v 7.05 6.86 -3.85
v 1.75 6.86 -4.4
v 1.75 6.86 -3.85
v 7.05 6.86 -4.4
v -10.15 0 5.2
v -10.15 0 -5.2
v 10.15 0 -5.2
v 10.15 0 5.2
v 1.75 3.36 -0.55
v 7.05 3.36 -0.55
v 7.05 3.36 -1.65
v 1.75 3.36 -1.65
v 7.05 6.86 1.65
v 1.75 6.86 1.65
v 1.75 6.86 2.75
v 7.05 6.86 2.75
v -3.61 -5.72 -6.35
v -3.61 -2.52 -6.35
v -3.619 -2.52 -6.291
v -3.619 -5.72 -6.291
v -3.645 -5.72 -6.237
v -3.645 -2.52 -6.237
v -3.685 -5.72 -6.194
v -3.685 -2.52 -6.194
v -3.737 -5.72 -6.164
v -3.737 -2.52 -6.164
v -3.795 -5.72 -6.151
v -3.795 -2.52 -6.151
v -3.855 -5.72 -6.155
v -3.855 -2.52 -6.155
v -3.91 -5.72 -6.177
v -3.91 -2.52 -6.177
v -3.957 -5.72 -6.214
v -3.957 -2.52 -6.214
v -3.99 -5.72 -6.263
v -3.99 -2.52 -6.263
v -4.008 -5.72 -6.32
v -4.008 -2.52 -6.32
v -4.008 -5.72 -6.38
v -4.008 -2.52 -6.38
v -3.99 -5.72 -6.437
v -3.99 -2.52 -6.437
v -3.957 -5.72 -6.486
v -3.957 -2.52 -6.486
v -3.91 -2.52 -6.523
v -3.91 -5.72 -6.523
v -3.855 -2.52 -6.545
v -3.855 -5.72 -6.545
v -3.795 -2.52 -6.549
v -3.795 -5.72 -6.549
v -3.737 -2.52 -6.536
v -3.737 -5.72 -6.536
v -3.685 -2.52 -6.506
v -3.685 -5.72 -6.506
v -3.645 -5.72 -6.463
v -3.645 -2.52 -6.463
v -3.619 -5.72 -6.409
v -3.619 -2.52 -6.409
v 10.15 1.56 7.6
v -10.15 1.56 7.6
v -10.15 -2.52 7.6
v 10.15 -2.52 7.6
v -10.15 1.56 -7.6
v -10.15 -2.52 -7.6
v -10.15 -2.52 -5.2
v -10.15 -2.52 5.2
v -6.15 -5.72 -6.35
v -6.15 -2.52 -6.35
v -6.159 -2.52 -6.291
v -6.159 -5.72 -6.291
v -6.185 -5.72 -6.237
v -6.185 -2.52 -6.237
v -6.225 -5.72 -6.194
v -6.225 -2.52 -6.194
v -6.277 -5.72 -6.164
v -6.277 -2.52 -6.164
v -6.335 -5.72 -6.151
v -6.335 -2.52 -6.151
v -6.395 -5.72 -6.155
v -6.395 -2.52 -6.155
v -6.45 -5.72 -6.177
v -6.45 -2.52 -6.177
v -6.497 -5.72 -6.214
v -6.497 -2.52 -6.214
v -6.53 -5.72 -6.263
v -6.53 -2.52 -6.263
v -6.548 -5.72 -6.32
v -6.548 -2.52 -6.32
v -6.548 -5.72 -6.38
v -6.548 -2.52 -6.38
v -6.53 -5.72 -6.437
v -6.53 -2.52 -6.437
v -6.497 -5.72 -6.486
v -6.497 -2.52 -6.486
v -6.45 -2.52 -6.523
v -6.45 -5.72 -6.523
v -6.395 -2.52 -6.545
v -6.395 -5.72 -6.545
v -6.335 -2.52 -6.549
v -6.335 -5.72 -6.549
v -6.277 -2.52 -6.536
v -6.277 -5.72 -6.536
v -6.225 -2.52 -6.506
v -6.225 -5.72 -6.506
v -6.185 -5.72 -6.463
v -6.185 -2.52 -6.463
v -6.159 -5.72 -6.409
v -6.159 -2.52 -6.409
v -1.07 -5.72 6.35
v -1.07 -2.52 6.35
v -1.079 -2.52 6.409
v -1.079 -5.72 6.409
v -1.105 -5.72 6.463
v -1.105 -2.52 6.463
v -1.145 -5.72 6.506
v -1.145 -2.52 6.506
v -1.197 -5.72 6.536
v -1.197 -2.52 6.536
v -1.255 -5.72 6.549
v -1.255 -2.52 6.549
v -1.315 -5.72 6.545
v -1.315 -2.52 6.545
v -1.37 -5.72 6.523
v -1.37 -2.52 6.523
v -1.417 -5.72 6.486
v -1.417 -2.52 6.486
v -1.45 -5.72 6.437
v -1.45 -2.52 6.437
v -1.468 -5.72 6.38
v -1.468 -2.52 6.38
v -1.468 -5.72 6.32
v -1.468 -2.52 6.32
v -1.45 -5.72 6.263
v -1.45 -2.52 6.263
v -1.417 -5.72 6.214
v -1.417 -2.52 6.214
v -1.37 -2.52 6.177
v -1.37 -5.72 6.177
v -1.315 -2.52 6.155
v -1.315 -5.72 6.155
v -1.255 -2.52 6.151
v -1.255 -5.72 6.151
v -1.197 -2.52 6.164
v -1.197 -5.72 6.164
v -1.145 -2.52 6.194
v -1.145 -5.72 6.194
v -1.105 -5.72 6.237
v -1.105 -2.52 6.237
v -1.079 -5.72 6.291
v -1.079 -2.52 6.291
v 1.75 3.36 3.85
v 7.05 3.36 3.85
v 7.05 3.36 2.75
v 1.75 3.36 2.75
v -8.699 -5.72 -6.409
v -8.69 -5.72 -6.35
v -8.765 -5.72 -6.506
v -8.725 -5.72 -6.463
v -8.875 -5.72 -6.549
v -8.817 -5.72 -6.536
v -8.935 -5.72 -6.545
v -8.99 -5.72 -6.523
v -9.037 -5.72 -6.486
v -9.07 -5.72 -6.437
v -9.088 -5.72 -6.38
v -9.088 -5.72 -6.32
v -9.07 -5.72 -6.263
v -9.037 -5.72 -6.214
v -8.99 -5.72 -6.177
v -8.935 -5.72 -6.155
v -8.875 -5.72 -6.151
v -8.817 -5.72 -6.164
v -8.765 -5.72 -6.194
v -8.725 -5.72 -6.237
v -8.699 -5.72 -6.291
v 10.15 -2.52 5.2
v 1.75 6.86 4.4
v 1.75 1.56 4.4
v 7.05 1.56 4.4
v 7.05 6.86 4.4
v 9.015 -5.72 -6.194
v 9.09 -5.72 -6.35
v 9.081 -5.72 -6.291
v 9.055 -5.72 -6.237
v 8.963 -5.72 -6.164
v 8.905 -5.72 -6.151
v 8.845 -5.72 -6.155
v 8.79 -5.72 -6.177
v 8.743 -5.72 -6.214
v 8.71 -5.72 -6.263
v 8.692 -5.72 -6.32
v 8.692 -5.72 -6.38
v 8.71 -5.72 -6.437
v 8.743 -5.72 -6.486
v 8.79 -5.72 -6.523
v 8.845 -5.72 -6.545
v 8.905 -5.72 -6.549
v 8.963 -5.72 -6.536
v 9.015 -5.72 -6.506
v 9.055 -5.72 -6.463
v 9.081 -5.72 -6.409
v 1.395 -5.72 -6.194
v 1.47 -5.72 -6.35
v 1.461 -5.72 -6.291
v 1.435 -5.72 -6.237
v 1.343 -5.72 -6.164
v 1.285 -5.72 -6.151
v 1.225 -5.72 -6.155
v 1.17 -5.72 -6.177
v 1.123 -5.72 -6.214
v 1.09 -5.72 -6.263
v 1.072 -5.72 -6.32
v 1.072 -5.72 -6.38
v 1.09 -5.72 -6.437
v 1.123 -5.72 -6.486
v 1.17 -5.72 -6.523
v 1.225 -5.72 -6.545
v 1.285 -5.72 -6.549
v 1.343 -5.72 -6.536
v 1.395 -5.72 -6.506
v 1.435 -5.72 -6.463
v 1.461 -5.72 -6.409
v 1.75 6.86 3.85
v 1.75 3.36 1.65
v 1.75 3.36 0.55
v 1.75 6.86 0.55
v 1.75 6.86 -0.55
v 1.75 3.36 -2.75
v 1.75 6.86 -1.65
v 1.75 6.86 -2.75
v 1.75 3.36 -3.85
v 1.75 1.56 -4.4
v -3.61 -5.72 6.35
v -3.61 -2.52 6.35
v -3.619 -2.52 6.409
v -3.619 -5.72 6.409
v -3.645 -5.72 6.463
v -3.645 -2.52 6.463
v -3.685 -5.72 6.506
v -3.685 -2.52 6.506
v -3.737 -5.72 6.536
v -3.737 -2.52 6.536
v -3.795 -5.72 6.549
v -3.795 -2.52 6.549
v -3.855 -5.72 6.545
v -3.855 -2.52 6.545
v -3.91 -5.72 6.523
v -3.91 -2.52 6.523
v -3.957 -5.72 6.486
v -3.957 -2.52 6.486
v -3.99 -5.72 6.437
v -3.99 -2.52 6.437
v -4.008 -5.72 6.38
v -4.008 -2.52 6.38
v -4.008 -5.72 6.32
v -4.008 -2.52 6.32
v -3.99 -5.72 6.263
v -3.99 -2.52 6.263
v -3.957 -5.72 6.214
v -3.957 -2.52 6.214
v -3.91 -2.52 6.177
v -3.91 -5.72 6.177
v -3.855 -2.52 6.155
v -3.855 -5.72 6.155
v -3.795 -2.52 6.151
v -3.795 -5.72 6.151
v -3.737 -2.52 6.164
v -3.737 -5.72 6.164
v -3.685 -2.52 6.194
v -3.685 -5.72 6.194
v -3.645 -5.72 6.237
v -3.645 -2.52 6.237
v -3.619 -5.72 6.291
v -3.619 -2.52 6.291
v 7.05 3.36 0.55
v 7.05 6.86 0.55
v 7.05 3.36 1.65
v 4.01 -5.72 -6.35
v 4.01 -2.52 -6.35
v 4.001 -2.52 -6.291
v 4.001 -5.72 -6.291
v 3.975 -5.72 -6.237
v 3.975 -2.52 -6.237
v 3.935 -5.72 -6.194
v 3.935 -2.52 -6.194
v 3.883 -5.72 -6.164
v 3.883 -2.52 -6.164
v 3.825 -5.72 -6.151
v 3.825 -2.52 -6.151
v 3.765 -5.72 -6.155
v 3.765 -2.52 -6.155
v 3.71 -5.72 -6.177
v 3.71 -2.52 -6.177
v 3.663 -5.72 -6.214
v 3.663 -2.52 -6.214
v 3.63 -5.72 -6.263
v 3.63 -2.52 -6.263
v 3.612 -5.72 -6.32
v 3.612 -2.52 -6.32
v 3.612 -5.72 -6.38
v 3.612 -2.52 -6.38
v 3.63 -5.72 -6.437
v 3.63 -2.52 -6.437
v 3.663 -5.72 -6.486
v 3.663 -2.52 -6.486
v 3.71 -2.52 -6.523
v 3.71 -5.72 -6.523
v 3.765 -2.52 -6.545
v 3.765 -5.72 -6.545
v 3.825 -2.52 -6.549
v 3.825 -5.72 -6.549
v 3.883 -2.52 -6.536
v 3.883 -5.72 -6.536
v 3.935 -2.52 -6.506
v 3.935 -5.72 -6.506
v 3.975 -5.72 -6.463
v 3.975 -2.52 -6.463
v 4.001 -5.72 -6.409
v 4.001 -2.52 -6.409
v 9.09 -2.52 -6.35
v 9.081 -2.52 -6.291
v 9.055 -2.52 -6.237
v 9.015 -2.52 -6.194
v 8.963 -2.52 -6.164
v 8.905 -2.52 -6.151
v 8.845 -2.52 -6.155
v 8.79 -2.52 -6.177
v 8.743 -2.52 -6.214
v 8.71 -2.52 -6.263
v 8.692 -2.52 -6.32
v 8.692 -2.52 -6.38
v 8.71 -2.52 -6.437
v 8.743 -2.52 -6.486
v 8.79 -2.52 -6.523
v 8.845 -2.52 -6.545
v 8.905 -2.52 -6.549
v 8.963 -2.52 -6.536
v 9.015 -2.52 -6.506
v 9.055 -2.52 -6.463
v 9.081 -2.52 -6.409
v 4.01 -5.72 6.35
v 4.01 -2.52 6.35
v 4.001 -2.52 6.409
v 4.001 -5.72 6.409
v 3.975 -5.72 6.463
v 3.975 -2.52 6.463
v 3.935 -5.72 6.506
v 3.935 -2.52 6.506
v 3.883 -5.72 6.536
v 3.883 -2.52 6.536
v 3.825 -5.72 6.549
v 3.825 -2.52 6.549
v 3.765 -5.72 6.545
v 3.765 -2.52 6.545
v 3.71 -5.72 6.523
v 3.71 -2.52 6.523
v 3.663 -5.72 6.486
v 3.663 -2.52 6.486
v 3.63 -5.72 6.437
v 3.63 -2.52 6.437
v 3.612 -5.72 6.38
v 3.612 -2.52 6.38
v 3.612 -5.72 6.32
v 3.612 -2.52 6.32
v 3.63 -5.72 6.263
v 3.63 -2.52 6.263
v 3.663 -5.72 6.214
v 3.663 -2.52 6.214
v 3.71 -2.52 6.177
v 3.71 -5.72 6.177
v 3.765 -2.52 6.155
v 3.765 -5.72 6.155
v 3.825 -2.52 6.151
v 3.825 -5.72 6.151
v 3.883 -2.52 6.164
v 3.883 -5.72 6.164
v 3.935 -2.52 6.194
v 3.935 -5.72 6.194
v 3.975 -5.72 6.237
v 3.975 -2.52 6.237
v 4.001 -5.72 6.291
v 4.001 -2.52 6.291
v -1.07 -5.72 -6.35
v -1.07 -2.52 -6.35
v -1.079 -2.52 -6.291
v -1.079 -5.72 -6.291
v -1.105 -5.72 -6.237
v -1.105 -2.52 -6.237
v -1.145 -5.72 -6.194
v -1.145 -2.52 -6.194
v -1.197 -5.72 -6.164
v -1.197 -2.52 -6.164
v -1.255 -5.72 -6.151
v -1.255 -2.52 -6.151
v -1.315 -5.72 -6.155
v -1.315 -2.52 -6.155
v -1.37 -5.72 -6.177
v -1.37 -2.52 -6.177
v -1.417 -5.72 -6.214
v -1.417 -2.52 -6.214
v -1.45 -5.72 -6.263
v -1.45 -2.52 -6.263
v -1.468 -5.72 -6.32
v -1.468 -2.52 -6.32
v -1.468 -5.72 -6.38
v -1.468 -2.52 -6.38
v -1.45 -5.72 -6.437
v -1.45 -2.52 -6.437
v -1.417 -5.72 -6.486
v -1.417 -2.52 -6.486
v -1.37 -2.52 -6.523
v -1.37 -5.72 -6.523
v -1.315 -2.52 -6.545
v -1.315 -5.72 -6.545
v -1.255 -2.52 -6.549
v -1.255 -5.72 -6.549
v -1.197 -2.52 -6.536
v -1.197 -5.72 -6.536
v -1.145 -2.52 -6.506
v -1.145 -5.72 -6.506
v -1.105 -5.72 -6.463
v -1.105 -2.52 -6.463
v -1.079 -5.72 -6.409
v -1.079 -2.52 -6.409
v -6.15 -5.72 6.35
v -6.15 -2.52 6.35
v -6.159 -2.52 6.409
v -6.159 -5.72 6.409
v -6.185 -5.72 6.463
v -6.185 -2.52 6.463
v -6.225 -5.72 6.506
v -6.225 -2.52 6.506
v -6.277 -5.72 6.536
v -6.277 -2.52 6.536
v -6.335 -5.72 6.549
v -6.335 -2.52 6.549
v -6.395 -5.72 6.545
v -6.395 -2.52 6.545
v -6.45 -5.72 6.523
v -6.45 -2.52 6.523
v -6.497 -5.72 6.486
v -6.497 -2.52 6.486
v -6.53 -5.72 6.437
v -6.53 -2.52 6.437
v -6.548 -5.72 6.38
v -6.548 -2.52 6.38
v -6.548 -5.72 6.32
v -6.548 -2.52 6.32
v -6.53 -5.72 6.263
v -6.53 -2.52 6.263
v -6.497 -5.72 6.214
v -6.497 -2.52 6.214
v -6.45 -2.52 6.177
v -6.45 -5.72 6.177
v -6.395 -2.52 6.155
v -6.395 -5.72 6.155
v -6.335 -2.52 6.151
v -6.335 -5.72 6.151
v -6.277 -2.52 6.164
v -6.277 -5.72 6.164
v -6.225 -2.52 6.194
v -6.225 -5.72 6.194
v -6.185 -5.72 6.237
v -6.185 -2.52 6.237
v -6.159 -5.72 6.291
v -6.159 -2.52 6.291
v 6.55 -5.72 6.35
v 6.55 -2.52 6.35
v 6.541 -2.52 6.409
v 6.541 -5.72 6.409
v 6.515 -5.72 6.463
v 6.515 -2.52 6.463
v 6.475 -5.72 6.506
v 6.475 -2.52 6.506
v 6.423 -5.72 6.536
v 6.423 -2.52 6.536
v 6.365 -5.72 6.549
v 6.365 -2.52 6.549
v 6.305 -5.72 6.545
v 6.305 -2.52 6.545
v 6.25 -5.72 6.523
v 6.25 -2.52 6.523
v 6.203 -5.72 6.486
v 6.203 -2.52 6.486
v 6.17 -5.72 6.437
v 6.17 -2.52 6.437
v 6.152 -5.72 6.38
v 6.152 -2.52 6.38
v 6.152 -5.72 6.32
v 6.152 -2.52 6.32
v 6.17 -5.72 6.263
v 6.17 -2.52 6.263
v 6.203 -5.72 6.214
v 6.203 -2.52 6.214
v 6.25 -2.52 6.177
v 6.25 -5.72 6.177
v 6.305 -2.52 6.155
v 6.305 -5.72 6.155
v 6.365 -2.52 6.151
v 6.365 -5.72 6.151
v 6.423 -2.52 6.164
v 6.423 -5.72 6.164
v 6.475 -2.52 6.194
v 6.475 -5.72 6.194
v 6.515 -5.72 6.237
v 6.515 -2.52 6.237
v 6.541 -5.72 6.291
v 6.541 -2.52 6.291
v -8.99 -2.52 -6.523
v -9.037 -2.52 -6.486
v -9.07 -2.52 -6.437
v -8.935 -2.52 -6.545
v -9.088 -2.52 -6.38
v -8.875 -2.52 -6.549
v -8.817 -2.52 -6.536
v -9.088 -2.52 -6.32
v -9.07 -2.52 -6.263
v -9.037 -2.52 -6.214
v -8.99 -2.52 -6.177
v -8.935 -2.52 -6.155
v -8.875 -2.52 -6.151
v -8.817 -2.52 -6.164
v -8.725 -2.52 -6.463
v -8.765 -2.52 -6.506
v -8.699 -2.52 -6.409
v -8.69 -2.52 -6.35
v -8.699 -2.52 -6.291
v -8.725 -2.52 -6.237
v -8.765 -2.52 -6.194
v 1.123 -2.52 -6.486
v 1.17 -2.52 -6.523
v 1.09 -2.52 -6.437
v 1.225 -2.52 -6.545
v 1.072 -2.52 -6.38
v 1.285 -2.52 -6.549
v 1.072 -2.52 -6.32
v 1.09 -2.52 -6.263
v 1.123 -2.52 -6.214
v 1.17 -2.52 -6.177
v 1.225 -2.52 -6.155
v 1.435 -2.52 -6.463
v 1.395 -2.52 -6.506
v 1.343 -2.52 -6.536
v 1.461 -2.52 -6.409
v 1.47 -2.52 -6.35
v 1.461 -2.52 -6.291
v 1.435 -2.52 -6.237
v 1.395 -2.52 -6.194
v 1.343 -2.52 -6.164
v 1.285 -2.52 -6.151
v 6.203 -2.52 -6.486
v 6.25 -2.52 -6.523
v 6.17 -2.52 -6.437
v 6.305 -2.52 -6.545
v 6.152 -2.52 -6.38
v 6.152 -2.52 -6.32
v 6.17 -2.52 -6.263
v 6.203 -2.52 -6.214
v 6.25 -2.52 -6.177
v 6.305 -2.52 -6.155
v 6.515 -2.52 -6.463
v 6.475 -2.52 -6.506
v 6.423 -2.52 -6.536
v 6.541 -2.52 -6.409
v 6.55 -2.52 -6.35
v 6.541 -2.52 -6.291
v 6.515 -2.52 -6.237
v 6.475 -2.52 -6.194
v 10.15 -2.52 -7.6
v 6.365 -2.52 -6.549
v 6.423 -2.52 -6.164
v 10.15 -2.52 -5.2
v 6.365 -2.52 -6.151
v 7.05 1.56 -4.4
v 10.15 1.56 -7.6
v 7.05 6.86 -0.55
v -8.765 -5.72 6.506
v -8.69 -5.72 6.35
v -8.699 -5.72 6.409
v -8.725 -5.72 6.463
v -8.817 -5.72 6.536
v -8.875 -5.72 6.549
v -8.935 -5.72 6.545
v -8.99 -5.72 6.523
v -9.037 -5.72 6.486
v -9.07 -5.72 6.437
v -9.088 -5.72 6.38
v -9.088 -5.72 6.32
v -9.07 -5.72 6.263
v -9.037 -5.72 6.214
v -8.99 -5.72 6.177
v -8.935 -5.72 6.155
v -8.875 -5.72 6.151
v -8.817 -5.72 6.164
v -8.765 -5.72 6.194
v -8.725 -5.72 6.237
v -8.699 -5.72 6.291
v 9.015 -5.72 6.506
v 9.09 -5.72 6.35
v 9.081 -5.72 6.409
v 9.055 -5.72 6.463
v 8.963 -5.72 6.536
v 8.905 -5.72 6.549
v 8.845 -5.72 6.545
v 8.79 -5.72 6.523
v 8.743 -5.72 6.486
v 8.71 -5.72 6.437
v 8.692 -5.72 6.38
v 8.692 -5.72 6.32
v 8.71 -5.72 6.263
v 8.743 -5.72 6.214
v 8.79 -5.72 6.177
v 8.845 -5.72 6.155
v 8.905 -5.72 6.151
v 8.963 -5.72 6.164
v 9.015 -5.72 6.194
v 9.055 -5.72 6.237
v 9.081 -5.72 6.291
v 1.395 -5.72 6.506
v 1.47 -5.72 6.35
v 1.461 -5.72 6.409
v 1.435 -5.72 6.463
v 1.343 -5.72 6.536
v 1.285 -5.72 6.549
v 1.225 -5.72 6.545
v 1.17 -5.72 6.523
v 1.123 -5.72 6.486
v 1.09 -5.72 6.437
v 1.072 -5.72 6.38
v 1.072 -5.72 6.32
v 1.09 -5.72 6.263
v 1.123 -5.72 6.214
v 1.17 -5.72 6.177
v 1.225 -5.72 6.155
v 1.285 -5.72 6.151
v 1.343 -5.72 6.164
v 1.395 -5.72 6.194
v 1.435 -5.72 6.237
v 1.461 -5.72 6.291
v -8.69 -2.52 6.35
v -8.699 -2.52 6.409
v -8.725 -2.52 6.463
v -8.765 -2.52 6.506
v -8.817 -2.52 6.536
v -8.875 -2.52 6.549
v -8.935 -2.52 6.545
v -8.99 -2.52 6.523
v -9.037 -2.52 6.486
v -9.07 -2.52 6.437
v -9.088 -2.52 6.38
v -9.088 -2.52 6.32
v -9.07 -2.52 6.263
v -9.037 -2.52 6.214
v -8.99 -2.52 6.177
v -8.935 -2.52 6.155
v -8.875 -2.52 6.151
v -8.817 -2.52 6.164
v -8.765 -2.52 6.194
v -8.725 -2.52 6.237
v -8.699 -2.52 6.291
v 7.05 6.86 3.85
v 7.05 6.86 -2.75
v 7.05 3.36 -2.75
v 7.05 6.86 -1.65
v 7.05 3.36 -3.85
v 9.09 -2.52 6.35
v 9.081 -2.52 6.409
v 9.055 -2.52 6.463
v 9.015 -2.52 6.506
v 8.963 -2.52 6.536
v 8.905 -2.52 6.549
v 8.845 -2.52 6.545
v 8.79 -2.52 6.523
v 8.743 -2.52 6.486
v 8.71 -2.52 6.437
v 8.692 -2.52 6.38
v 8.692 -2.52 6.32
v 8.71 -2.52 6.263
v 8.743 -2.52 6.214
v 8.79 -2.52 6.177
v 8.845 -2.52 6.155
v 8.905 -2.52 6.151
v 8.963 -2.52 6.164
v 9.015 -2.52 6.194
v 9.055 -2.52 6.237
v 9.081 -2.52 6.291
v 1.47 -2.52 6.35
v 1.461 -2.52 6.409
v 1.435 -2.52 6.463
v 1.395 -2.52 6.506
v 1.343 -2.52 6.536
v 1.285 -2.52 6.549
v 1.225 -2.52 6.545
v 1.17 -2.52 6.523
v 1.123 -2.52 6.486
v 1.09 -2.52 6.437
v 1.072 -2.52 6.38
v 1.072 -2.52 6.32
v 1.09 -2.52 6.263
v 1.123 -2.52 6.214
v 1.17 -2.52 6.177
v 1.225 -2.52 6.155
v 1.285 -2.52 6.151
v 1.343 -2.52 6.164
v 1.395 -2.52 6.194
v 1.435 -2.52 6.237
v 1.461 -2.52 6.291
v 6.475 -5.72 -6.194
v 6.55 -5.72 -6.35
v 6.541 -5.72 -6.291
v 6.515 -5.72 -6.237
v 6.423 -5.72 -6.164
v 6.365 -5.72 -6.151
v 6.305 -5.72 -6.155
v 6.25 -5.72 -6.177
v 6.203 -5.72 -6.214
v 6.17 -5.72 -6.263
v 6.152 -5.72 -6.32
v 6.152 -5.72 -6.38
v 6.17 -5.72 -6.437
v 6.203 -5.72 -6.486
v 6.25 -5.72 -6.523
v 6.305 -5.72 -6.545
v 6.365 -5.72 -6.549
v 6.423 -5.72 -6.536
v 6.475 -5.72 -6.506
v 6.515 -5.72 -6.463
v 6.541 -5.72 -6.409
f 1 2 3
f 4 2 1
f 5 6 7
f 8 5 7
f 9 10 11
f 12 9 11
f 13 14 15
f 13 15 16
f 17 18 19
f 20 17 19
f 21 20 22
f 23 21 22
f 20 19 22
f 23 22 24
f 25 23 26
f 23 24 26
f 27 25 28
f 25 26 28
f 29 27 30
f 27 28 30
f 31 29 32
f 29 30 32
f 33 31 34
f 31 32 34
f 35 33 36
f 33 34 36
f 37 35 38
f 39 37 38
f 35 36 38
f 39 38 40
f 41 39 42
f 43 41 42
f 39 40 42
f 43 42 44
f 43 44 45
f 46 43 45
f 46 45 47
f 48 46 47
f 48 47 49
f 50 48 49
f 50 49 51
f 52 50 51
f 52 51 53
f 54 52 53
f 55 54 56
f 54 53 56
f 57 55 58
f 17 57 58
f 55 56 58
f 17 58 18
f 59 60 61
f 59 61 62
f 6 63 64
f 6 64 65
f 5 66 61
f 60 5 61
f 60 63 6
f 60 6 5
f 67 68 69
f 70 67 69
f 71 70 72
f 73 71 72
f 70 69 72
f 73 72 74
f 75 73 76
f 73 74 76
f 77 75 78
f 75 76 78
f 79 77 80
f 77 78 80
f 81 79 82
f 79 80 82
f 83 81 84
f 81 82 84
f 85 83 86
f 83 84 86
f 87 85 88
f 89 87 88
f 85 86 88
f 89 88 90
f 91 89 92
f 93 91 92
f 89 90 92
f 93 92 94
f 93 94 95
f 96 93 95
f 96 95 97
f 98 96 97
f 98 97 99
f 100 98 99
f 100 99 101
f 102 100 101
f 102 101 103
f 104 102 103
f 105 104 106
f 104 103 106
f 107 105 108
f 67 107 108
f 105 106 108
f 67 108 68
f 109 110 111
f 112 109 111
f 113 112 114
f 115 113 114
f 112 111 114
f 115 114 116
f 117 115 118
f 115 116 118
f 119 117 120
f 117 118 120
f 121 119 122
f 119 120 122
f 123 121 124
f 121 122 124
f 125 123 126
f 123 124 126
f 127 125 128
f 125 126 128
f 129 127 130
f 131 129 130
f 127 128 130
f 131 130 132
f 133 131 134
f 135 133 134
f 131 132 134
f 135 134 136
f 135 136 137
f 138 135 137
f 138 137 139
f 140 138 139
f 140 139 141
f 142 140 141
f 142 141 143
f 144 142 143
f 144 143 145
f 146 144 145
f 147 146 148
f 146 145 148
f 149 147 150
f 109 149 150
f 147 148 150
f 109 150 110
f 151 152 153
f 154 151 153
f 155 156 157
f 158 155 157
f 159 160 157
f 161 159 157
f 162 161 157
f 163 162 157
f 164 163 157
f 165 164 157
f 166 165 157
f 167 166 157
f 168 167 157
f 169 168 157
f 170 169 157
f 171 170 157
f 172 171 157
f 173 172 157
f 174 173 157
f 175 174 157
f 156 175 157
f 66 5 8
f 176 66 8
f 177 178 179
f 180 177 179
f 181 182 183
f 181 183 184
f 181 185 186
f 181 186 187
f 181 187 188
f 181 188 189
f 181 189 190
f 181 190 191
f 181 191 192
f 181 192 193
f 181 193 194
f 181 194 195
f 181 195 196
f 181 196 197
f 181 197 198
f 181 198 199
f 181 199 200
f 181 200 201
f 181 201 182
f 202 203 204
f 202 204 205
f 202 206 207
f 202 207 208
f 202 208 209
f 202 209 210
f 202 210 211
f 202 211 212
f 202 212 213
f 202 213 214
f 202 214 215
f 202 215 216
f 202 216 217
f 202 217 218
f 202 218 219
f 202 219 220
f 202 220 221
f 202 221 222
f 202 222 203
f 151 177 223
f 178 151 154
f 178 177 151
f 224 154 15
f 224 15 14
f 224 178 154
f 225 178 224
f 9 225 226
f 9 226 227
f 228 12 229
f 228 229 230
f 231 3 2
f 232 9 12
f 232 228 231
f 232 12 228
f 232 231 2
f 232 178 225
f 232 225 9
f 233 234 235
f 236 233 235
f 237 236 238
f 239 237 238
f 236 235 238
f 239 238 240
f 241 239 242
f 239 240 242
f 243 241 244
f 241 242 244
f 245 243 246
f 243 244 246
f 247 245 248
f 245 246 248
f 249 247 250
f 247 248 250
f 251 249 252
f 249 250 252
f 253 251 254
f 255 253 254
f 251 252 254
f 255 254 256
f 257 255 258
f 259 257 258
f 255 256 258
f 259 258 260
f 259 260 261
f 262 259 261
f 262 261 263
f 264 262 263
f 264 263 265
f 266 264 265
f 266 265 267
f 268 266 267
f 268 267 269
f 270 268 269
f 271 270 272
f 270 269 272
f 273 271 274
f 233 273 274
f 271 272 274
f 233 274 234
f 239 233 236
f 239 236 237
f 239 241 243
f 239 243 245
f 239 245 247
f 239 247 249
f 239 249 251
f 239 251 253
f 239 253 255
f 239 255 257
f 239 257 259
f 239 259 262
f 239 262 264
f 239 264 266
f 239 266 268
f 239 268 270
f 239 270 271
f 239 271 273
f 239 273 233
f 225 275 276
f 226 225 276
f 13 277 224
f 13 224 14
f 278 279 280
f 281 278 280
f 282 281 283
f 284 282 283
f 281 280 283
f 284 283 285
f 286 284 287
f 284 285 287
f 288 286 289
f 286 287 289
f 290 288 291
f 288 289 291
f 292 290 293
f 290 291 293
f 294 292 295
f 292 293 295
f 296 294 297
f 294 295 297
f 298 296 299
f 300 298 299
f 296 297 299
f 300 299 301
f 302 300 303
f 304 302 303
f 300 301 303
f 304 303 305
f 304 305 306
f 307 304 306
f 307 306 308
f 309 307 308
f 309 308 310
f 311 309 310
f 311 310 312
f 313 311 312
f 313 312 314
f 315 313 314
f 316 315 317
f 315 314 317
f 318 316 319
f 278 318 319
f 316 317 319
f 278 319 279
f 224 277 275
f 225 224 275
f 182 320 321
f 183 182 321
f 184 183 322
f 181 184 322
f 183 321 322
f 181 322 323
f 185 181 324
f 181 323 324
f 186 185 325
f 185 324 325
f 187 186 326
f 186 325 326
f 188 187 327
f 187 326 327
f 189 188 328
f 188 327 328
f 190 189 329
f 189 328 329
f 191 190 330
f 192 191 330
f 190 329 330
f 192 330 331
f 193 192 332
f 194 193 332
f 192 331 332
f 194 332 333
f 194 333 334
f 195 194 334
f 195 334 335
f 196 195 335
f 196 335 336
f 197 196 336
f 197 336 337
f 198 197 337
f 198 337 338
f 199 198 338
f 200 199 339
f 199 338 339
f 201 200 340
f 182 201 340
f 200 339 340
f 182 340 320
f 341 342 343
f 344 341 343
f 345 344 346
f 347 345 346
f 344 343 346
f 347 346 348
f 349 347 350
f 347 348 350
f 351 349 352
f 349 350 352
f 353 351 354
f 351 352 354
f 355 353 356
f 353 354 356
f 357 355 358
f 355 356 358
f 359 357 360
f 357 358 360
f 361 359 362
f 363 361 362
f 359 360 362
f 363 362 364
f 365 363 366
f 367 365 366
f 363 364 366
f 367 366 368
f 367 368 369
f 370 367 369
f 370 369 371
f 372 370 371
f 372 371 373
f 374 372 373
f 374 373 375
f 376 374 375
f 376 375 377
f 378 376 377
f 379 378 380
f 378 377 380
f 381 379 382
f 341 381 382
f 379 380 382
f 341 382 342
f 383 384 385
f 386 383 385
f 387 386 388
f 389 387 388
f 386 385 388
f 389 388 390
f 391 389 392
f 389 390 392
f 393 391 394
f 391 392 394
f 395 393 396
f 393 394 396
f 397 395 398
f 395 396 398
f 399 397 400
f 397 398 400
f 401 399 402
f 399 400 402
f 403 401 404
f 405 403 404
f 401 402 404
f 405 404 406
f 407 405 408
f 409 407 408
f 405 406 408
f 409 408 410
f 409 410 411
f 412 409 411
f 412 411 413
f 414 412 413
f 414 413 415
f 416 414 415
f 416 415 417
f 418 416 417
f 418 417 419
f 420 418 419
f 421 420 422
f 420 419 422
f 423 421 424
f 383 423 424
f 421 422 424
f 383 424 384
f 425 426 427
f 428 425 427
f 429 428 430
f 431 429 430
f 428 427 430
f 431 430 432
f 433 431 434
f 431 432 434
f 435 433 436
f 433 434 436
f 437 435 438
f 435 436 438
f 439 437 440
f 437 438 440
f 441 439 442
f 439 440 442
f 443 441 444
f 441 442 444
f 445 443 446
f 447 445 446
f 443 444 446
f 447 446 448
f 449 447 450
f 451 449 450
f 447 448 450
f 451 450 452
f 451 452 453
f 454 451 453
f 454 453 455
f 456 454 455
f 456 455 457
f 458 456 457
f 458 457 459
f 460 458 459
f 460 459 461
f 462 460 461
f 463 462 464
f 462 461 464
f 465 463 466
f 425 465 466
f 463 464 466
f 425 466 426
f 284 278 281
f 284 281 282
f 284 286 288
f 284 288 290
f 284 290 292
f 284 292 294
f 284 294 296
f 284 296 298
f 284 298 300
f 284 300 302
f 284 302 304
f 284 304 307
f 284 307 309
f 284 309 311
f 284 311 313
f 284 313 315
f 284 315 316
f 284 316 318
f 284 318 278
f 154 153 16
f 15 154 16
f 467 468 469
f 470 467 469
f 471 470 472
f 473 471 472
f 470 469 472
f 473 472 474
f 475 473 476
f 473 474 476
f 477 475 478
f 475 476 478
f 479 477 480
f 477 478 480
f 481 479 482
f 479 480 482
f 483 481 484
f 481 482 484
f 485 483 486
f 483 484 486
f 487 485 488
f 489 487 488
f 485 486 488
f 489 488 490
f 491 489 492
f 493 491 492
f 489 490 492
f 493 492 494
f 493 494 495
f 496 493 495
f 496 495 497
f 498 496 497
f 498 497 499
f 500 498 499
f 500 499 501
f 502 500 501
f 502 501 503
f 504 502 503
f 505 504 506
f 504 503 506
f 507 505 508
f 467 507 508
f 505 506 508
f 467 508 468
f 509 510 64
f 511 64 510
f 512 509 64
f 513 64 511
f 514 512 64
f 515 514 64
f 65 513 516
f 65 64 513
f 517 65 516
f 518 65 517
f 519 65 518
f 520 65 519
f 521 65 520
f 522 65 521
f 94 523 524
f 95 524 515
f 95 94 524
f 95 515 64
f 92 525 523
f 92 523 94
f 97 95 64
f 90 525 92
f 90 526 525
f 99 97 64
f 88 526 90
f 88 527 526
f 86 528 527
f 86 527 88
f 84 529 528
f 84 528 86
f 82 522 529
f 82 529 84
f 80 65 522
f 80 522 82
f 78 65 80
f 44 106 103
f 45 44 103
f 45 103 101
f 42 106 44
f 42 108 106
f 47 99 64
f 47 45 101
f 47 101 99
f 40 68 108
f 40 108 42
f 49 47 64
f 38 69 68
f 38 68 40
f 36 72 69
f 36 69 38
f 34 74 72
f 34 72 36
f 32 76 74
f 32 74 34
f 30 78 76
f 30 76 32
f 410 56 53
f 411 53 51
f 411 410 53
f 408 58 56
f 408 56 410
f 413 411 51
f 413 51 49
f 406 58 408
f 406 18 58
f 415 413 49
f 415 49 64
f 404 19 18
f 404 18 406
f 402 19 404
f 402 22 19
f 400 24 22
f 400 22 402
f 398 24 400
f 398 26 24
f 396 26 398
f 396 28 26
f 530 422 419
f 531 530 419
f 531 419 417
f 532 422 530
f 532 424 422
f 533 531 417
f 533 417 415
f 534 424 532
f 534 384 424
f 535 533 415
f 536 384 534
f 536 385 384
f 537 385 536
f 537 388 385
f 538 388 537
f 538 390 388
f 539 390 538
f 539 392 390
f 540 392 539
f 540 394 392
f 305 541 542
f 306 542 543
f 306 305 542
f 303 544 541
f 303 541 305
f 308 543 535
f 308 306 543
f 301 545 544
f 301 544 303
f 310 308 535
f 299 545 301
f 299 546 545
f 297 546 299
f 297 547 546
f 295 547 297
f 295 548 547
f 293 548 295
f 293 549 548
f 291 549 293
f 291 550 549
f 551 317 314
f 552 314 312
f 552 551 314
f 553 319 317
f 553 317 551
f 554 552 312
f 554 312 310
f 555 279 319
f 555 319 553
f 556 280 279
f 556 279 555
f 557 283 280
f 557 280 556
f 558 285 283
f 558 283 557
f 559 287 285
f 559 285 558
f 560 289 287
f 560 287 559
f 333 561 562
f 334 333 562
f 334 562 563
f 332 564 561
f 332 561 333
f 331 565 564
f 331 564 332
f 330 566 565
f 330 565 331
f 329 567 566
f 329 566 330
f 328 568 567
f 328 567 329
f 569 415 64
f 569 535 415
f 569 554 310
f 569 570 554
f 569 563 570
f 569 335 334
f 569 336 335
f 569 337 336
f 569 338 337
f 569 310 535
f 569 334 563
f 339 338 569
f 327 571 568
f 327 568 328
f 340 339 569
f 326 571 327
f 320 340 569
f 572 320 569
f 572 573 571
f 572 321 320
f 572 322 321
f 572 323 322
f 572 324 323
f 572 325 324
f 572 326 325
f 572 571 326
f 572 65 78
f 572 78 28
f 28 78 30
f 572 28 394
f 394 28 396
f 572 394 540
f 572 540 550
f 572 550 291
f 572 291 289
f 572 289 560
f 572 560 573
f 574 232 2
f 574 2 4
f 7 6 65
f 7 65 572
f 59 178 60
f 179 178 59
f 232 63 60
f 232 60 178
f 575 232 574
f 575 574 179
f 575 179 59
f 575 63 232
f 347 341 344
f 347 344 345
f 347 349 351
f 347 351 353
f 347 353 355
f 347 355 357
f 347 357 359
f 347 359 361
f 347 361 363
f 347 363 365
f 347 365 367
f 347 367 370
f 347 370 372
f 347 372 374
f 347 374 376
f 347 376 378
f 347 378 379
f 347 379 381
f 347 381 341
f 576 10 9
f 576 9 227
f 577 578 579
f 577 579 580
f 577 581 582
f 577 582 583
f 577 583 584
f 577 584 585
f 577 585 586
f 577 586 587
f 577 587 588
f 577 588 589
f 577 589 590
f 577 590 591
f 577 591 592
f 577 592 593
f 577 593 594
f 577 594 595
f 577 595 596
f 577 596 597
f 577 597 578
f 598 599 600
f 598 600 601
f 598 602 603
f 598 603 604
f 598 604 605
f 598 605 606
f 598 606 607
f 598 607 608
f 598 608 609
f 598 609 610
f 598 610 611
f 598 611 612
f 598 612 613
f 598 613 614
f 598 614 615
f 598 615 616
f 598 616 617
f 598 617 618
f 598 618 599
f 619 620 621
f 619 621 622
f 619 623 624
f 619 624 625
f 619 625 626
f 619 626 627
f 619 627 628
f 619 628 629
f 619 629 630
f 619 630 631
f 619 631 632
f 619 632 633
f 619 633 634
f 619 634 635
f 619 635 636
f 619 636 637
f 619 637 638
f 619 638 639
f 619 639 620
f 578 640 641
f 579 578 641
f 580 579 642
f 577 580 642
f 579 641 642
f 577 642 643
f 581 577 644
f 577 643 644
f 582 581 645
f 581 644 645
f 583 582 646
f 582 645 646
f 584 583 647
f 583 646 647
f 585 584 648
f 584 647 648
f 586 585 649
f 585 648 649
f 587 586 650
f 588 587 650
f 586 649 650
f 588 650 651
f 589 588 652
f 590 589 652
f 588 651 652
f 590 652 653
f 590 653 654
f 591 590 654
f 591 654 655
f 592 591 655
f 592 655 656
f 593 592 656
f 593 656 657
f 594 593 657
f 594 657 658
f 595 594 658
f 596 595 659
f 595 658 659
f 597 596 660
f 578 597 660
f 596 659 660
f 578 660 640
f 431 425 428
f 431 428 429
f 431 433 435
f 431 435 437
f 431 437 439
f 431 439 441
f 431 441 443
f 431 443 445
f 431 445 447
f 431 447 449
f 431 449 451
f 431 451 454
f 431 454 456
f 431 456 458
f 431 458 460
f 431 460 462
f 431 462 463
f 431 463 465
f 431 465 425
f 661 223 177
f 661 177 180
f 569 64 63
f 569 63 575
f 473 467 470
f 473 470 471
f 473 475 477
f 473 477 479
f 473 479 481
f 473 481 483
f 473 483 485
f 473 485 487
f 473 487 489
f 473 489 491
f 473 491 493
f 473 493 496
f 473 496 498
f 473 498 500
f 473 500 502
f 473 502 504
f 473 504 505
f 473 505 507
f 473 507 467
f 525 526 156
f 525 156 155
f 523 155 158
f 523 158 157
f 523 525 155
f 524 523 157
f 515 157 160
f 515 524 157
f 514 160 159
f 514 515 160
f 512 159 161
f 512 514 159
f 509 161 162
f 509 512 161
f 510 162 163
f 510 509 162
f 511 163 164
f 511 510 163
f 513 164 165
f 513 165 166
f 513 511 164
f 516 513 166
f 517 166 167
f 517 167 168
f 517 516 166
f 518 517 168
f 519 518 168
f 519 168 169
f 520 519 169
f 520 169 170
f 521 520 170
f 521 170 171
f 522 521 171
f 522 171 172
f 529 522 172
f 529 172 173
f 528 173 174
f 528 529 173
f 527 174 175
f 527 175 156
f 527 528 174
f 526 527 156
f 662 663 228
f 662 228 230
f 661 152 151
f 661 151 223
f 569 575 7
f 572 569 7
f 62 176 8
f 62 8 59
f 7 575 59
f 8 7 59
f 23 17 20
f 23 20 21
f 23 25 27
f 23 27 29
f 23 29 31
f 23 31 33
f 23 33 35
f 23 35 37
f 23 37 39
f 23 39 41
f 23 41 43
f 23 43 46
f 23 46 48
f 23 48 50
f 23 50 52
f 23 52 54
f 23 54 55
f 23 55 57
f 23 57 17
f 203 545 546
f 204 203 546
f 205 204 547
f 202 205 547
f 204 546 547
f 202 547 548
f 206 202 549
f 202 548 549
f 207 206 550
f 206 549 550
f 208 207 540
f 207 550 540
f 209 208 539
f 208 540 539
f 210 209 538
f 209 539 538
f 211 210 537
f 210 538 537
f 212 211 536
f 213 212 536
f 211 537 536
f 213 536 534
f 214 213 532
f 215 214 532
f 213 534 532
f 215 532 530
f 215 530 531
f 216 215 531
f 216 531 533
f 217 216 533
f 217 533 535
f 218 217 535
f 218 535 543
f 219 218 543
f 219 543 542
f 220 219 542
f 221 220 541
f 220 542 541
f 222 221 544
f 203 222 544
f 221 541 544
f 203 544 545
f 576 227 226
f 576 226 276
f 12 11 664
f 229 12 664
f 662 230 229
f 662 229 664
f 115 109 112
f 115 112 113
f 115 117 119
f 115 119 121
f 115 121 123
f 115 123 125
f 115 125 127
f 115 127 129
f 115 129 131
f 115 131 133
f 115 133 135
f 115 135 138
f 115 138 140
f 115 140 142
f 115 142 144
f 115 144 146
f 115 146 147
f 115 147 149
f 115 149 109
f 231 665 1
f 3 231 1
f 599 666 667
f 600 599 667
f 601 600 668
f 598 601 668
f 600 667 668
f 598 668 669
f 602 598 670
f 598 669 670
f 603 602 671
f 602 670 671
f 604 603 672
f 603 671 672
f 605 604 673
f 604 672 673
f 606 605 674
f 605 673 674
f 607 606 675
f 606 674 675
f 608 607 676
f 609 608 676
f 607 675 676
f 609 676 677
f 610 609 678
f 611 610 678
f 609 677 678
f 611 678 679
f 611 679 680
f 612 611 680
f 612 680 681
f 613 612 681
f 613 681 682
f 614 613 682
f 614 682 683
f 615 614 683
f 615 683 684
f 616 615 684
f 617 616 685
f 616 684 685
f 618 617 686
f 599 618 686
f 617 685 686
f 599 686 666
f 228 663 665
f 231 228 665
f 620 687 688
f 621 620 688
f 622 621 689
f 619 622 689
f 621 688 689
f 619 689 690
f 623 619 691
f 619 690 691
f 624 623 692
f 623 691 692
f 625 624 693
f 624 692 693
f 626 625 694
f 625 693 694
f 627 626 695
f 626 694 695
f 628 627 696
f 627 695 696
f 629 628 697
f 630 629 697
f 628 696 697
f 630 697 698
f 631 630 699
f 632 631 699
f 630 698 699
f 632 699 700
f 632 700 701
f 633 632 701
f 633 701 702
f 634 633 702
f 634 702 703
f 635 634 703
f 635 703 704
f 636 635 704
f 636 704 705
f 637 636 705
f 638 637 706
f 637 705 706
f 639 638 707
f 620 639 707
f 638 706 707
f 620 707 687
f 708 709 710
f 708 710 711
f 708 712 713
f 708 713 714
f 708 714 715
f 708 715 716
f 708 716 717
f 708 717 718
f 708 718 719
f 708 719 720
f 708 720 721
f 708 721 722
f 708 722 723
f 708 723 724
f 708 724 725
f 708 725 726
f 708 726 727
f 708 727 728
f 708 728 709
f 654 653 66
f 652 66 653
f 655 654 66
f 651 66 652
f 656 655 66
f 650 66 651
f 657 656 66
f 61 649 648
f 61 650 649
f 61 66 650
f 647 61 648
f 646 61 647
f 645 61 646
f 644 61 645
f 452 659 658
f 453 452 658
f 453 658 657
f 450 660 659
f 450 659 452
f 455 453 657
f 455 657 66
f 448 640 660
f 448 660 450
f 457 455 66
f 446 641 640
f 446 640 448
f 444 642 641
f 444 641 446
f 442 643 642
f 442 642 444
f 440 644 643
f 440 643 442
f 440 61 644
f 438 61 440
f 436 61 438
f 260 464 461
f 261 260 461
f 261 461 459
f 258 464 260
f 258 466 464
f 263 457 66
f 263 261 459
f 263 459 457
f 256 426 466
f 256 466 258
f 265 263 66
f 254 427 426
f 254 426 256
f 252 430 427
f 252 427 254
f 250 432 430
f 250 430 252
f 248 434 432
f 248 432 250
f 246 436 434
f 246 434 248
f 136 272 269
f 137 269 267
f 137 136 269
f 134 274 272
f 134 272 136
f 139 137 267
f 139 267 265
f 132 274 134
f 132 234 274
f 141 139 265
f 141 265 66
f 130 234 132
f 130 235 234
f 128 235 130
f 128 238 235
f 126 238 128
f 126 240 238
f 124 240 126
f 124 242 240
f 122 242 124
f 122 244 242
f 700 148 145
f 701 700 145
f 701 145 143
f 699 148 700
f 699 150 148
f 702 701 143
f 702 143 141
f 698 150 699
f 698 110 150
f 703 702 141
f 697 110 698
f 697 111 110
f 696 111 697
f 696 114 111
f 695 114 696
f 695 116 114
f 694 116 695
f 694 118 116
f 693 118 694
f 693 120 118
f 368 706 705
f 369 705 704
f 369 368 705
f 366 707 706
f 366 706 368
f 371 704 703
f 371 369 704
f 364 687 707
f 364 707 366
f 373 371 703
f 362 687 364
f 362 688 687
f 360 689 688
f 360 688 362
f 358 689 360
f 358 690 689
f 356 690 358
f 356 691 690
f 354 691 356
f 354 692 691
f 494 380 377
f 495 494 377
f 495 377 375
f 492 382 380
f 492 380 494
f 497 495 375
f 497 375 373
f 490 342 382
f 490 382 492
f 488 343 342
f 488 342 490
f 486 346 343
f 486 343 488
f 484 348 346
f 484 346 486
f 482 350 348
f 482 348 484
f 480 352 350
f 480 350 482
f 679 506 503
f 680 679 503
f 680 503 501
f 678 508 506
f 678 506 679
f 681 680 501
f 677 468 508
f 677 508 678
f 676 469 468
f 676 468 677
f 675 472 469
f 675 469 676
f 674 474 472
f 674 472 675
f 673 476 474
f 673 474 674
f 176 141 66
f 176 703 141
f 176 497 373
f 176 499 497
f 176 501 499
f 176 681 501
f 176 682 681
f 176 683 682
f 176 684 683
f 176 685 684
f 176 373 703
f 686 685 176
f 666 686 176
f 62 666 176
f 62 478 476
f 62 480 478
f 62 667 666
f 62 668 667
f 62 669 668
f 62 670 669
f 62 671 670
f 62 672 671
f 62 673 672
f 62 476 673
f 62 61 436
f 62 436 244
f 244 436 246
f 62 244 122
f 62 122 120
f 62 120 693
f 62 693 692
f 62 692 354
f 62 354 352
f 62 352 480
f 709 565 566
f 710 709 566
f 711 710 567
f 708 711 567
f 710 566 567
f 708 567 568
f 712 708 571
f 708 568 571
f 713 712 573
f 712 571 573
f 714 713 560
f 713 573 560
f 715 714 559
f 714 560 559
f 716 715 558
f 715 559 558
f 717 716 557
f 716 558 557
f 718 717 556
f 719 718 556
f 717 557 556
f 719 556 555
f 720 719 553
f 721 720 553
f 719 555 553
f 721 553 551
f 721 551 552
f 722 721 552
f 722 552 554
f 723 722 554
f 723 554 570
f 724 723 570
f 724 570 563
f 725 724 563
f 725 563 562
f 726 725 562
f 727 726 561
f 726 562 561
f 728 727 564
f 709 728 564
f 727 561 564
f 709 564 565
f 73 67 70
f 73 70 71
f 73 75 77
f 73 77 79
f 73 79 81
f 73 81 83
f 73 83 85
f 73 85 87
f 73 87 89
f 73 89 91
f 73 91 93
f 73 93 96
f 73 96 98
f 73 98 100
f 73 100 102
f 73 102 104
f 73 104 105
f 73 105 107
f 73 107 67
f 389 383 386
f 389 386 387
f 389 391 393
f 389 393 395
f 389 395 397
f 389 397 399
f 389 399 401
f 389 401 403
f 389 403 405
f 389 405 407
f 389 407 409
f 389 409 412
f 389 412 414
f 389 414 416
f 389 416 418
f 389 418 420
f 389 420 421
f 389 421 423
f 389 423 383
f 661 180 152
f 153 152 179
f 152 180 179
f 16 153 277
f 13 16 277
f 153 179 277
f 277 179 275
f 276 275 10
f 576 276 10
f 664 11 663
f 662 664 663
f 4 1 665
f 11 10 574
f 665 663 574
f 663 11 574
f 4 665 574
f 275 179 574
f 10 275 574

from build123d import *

# Parameters (mm, degrees)
SKETCH1_W               = 20.3
SKETCH1_H               = 15.2
BOSS_EXTRUDE1_DEPTH     = 1.56
SKETCH2_W               = 20.3
SKETCH2_H               = 2.4
BOSS_EXTRUDE2_DEPTH     = 2.52
SKETCH3_R               = 0.2
BOSS_EXTRUDE3_DEPTH     = 3.2
LPATTERN1_COUNT         = 8
LPATTERN1_PITCH         = 2.54
MIRROR1_COPY_1_SKETCH_R = 0.2
MIRROR1_COPY_1_DEPTH    = 3.2
MIRROR1_COPY_2_SKETCH_R = 0.2
MIRROR1_COPY_2_DEPTH    = 3.2
MIRROR1_COPY_3_SKETCH_R = 0.2
MIRROR1_COPY_3_DEPTH    = 3.2
MIRROR1_COPY_4_SKETCH_R = 0.2
MIRROR1_COPY_4_DEPTH    = 3.2
MIRROR1_COPY_5_SKETCH_R = 0.2
MIRROR1_COPY_5_DEPTH    = 3.2
MIRROR1_COPY_6_SKETCH_R = 0.2
MIRROR1_COPY_6_DEPTH    = 3.2
MIRROR1_COPY_7_SKETCH_R = 0.2
MIRROR1_COPY_7_DEPTH    = 3.2
SKETCH4_W               = 5.3
SKETCH4_H               = 8.8
BOSS_EXTRUDE4_DEPTH     = 5.3
SKETCH5_W               = 1.1
SKETCH5_H               = 3.5
CUT_EXTRUDE1_DEPTH      = 5.3


with BuildPart() as part:
    # Sketch1 → Boss-Extrude1 (new body)
    with BuildSketch(Plane(origin=(0, 0, 0), x_dir=(1, 0, 0), z_dir=(0, 1, 0))):
        Rectangle(SKETCH1_W, SKETCH1_H)
    extrude(amount=BOSS_EXTRUDE1_DEPTH)

    # Sketch2 → Boss-Extrude2 (add)
    with BuildSketch(Plane.XZ):
        with Locations((0, 6.4)):
            Rectangle(SKETCH2_W, SKETCH2_H)
        with Locations((0, -6.4)):
            Rectangle(SKETCH2_W, SKETCH2_H)
    extrude(amount=BOSS_EXTRUDE2_DEPTH)

    # Sketch3 → Boss-Extrude3 (add)
    with BuildSketch(Plane.XZ.offset(2.52)):
        with Locations((-8.89, 6.35)):
            Circle(SKETCH3_R)
    boss_extrude3 = extrude(amount=BOSS_EXTRUDE3_DEPTH)

    # LPattern1: Boss-Extrude3 ×8
    with Locations(*[(i * LPATTERN1_PITCH, 0, 0) for i in range(1, LPATTERN1_COUNT)]):
        add(boss_extrude3)

    # Mirror1: Boss-Extrude3 across plane
    add(boss_extrude3.mirror(Plane.XY))

    # Mirror1 copy 1 sketch → Mirror1 copy 1 (add)
    with BuildSketch(Plane(origin=(2.54, -2.52, 0), x_dir=(1, 0, 0), z_dir=(0, -1, 0))):
        with Locations((-8.89, -6.35)):
            Circle(MIRROR1_COPY_1_SKETCH_R)
    extrude(amount=MIRROR1_COPY_1_DEPTH)

    # Mirror1 copy 2 sketch → Mirror1 copy 2 (add)
    with BuildSketch(Plane(origin=(5.08, -2.52, 0), x_dir=(1, 0, 0), z_dir=(0, -1, 0))):
        with Locations((-8.89, -6.35)):
            Circle(MIRROR1_COPY_2_SKETCH_R)
    extrude(amount=MIRROR1_COPY_2_DEPTH)

    # Mirror1 copy 3 sketch → Mirror1 copy 3 (add)
    with BuildSketch(Plane(origin=(7.62, -2.52, 0), x_dir=(1, 0, 0), z_dir=(0, -1, 0))):
        with Locations((-8.89, -6.35)):
            Circle(MIRROR1_COPY_3_SKETCH_R)
    extrude(amount=MIRROR1_COPY_3_DEPTH)

    # Mirror1 copy 4 sketch → Mirror1 copy 4 (add)
    with BuildSketch(Plane(origin=(10.16, -2.52, 0), x_dir=(1, 0, 0), z_dir=(0, -1, 0))):
        with Locations((-8.89, -6.35)):
            Circle(MIRROR1_COPY_4_SKETCH_R)
    extrude(amount=MIRROR1_COPY_4_DEPTH)

    # Mirror1 copy 5 sketch → Mirror1 copy 5 (add)
    with BuildSketch(Plane(origin=(12.7, -2.52, 0), x_dir=(1, 0, 0), z_dir=(0, -1, 0))):
        with Locations((-8.89, -6.35)):
            Circle(MIRROR1_COPY_5_SKETCH_R)
    extrude(amount=MIRROR1_COPY_5_DEPTH)

    # Mirror1 copy 6 sketch → Mirror1 copy 6 (add)
    with BuildSketch(Plane(origin=(15.24, -2.52, 0), x_dir=(1, 0, 0), z_dir=(0, -1, 0))):
        with Locations((-8.89, -6.35)):
            Circle(MIRROR1_COPY_6_SKETCH_R)
    extrude(amount=MIRROR1_COPY_6_DEPTH)

    # Mirror1 copy 7 sketch → Mirror1 copy 7 (add)
    with BuildSketch(Plane(origin=(17.78, -2.52, 0), x_dir=(1, 0, 0), z_dir=(0, -1, 0))):
        with Locations((-8.89, -6.35)):
            Circle(MIRROR1_COPY_7_SKETCH_R)
    extrude(amount=MIRROR1_COPY_7_DEPTH)

    # Sketch4 → Boss-Extrude4 (add)
    with BuildSketch(Plane(origin=(0, 1.56, 0), x_dir=(1, 0, 0), z_dir=(0, 1, 0))):
        with Locations((4.4, 0)):
            Rectangle(SKETCH4_W, SKETCH4_H)
    extrude(amount=BOSS_EXTRUDE4_DEPTH)

    # Sketch5 → Cut-Extrude1 (cut)
    with BuildSketch(Plane(origin=(7.05, 0, 0), x_dir=(0, 0, -1), z_dir=(1, 0, 0))):
        with Locations((-3.3, 5.11)):
            Rectangle(SKETCH5_W, SKETCH5_H)
        with Locations((-1.1, 5.11)):
            Rectangle(SKETCH5_W, SKETCH5_H)
        with Locations((1.1, 5.11)):
            Rectangle(SKETCH5_W, SKETCH5_H)
        with Locations((3.3, 5.11)):
            Rectangle(SKETCH5_W, SKETCH5_H)
    extrude(amount=-CUT_EXTRUDE1_DEPTH, mode=Mode.SUBTRACT)


solid = part.part
